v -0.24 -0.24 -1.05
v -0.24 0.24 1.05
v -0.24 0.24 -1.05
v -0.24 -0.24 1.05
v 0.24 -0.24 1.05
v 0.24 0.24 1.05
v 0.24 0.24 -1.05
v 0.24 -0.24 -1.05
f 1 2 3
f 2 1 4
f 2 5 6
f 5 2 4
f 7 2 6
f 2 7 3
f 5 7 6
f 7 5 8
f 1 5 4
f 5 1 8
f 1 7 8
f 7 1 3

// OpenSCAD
module chamfered_block() {
    difference() {
        // Main block with top and bottom taper
        hull() {
            translate([0, 0, -1]) scale([0.6, 0.6, 1]) cube([0.8, 0.8, 0.1], center=true);
            translate([0, 0, 1]) scale([0.6, 0.6, 1]) cube([0.8, 0.8, 0.1], center=true);
        }
        // Chamfered edges
        for (i = [0:3]) {
            rotate([0, 0, i * 90]) {
                translate([0.4, 0.4, 0]) {
                    rotate([45, 0, 0]) {
                        cube([0.2, 0.2, 2.4], center=true);
                    }
                }
            }
        }
    }
}

chamfered_block();
